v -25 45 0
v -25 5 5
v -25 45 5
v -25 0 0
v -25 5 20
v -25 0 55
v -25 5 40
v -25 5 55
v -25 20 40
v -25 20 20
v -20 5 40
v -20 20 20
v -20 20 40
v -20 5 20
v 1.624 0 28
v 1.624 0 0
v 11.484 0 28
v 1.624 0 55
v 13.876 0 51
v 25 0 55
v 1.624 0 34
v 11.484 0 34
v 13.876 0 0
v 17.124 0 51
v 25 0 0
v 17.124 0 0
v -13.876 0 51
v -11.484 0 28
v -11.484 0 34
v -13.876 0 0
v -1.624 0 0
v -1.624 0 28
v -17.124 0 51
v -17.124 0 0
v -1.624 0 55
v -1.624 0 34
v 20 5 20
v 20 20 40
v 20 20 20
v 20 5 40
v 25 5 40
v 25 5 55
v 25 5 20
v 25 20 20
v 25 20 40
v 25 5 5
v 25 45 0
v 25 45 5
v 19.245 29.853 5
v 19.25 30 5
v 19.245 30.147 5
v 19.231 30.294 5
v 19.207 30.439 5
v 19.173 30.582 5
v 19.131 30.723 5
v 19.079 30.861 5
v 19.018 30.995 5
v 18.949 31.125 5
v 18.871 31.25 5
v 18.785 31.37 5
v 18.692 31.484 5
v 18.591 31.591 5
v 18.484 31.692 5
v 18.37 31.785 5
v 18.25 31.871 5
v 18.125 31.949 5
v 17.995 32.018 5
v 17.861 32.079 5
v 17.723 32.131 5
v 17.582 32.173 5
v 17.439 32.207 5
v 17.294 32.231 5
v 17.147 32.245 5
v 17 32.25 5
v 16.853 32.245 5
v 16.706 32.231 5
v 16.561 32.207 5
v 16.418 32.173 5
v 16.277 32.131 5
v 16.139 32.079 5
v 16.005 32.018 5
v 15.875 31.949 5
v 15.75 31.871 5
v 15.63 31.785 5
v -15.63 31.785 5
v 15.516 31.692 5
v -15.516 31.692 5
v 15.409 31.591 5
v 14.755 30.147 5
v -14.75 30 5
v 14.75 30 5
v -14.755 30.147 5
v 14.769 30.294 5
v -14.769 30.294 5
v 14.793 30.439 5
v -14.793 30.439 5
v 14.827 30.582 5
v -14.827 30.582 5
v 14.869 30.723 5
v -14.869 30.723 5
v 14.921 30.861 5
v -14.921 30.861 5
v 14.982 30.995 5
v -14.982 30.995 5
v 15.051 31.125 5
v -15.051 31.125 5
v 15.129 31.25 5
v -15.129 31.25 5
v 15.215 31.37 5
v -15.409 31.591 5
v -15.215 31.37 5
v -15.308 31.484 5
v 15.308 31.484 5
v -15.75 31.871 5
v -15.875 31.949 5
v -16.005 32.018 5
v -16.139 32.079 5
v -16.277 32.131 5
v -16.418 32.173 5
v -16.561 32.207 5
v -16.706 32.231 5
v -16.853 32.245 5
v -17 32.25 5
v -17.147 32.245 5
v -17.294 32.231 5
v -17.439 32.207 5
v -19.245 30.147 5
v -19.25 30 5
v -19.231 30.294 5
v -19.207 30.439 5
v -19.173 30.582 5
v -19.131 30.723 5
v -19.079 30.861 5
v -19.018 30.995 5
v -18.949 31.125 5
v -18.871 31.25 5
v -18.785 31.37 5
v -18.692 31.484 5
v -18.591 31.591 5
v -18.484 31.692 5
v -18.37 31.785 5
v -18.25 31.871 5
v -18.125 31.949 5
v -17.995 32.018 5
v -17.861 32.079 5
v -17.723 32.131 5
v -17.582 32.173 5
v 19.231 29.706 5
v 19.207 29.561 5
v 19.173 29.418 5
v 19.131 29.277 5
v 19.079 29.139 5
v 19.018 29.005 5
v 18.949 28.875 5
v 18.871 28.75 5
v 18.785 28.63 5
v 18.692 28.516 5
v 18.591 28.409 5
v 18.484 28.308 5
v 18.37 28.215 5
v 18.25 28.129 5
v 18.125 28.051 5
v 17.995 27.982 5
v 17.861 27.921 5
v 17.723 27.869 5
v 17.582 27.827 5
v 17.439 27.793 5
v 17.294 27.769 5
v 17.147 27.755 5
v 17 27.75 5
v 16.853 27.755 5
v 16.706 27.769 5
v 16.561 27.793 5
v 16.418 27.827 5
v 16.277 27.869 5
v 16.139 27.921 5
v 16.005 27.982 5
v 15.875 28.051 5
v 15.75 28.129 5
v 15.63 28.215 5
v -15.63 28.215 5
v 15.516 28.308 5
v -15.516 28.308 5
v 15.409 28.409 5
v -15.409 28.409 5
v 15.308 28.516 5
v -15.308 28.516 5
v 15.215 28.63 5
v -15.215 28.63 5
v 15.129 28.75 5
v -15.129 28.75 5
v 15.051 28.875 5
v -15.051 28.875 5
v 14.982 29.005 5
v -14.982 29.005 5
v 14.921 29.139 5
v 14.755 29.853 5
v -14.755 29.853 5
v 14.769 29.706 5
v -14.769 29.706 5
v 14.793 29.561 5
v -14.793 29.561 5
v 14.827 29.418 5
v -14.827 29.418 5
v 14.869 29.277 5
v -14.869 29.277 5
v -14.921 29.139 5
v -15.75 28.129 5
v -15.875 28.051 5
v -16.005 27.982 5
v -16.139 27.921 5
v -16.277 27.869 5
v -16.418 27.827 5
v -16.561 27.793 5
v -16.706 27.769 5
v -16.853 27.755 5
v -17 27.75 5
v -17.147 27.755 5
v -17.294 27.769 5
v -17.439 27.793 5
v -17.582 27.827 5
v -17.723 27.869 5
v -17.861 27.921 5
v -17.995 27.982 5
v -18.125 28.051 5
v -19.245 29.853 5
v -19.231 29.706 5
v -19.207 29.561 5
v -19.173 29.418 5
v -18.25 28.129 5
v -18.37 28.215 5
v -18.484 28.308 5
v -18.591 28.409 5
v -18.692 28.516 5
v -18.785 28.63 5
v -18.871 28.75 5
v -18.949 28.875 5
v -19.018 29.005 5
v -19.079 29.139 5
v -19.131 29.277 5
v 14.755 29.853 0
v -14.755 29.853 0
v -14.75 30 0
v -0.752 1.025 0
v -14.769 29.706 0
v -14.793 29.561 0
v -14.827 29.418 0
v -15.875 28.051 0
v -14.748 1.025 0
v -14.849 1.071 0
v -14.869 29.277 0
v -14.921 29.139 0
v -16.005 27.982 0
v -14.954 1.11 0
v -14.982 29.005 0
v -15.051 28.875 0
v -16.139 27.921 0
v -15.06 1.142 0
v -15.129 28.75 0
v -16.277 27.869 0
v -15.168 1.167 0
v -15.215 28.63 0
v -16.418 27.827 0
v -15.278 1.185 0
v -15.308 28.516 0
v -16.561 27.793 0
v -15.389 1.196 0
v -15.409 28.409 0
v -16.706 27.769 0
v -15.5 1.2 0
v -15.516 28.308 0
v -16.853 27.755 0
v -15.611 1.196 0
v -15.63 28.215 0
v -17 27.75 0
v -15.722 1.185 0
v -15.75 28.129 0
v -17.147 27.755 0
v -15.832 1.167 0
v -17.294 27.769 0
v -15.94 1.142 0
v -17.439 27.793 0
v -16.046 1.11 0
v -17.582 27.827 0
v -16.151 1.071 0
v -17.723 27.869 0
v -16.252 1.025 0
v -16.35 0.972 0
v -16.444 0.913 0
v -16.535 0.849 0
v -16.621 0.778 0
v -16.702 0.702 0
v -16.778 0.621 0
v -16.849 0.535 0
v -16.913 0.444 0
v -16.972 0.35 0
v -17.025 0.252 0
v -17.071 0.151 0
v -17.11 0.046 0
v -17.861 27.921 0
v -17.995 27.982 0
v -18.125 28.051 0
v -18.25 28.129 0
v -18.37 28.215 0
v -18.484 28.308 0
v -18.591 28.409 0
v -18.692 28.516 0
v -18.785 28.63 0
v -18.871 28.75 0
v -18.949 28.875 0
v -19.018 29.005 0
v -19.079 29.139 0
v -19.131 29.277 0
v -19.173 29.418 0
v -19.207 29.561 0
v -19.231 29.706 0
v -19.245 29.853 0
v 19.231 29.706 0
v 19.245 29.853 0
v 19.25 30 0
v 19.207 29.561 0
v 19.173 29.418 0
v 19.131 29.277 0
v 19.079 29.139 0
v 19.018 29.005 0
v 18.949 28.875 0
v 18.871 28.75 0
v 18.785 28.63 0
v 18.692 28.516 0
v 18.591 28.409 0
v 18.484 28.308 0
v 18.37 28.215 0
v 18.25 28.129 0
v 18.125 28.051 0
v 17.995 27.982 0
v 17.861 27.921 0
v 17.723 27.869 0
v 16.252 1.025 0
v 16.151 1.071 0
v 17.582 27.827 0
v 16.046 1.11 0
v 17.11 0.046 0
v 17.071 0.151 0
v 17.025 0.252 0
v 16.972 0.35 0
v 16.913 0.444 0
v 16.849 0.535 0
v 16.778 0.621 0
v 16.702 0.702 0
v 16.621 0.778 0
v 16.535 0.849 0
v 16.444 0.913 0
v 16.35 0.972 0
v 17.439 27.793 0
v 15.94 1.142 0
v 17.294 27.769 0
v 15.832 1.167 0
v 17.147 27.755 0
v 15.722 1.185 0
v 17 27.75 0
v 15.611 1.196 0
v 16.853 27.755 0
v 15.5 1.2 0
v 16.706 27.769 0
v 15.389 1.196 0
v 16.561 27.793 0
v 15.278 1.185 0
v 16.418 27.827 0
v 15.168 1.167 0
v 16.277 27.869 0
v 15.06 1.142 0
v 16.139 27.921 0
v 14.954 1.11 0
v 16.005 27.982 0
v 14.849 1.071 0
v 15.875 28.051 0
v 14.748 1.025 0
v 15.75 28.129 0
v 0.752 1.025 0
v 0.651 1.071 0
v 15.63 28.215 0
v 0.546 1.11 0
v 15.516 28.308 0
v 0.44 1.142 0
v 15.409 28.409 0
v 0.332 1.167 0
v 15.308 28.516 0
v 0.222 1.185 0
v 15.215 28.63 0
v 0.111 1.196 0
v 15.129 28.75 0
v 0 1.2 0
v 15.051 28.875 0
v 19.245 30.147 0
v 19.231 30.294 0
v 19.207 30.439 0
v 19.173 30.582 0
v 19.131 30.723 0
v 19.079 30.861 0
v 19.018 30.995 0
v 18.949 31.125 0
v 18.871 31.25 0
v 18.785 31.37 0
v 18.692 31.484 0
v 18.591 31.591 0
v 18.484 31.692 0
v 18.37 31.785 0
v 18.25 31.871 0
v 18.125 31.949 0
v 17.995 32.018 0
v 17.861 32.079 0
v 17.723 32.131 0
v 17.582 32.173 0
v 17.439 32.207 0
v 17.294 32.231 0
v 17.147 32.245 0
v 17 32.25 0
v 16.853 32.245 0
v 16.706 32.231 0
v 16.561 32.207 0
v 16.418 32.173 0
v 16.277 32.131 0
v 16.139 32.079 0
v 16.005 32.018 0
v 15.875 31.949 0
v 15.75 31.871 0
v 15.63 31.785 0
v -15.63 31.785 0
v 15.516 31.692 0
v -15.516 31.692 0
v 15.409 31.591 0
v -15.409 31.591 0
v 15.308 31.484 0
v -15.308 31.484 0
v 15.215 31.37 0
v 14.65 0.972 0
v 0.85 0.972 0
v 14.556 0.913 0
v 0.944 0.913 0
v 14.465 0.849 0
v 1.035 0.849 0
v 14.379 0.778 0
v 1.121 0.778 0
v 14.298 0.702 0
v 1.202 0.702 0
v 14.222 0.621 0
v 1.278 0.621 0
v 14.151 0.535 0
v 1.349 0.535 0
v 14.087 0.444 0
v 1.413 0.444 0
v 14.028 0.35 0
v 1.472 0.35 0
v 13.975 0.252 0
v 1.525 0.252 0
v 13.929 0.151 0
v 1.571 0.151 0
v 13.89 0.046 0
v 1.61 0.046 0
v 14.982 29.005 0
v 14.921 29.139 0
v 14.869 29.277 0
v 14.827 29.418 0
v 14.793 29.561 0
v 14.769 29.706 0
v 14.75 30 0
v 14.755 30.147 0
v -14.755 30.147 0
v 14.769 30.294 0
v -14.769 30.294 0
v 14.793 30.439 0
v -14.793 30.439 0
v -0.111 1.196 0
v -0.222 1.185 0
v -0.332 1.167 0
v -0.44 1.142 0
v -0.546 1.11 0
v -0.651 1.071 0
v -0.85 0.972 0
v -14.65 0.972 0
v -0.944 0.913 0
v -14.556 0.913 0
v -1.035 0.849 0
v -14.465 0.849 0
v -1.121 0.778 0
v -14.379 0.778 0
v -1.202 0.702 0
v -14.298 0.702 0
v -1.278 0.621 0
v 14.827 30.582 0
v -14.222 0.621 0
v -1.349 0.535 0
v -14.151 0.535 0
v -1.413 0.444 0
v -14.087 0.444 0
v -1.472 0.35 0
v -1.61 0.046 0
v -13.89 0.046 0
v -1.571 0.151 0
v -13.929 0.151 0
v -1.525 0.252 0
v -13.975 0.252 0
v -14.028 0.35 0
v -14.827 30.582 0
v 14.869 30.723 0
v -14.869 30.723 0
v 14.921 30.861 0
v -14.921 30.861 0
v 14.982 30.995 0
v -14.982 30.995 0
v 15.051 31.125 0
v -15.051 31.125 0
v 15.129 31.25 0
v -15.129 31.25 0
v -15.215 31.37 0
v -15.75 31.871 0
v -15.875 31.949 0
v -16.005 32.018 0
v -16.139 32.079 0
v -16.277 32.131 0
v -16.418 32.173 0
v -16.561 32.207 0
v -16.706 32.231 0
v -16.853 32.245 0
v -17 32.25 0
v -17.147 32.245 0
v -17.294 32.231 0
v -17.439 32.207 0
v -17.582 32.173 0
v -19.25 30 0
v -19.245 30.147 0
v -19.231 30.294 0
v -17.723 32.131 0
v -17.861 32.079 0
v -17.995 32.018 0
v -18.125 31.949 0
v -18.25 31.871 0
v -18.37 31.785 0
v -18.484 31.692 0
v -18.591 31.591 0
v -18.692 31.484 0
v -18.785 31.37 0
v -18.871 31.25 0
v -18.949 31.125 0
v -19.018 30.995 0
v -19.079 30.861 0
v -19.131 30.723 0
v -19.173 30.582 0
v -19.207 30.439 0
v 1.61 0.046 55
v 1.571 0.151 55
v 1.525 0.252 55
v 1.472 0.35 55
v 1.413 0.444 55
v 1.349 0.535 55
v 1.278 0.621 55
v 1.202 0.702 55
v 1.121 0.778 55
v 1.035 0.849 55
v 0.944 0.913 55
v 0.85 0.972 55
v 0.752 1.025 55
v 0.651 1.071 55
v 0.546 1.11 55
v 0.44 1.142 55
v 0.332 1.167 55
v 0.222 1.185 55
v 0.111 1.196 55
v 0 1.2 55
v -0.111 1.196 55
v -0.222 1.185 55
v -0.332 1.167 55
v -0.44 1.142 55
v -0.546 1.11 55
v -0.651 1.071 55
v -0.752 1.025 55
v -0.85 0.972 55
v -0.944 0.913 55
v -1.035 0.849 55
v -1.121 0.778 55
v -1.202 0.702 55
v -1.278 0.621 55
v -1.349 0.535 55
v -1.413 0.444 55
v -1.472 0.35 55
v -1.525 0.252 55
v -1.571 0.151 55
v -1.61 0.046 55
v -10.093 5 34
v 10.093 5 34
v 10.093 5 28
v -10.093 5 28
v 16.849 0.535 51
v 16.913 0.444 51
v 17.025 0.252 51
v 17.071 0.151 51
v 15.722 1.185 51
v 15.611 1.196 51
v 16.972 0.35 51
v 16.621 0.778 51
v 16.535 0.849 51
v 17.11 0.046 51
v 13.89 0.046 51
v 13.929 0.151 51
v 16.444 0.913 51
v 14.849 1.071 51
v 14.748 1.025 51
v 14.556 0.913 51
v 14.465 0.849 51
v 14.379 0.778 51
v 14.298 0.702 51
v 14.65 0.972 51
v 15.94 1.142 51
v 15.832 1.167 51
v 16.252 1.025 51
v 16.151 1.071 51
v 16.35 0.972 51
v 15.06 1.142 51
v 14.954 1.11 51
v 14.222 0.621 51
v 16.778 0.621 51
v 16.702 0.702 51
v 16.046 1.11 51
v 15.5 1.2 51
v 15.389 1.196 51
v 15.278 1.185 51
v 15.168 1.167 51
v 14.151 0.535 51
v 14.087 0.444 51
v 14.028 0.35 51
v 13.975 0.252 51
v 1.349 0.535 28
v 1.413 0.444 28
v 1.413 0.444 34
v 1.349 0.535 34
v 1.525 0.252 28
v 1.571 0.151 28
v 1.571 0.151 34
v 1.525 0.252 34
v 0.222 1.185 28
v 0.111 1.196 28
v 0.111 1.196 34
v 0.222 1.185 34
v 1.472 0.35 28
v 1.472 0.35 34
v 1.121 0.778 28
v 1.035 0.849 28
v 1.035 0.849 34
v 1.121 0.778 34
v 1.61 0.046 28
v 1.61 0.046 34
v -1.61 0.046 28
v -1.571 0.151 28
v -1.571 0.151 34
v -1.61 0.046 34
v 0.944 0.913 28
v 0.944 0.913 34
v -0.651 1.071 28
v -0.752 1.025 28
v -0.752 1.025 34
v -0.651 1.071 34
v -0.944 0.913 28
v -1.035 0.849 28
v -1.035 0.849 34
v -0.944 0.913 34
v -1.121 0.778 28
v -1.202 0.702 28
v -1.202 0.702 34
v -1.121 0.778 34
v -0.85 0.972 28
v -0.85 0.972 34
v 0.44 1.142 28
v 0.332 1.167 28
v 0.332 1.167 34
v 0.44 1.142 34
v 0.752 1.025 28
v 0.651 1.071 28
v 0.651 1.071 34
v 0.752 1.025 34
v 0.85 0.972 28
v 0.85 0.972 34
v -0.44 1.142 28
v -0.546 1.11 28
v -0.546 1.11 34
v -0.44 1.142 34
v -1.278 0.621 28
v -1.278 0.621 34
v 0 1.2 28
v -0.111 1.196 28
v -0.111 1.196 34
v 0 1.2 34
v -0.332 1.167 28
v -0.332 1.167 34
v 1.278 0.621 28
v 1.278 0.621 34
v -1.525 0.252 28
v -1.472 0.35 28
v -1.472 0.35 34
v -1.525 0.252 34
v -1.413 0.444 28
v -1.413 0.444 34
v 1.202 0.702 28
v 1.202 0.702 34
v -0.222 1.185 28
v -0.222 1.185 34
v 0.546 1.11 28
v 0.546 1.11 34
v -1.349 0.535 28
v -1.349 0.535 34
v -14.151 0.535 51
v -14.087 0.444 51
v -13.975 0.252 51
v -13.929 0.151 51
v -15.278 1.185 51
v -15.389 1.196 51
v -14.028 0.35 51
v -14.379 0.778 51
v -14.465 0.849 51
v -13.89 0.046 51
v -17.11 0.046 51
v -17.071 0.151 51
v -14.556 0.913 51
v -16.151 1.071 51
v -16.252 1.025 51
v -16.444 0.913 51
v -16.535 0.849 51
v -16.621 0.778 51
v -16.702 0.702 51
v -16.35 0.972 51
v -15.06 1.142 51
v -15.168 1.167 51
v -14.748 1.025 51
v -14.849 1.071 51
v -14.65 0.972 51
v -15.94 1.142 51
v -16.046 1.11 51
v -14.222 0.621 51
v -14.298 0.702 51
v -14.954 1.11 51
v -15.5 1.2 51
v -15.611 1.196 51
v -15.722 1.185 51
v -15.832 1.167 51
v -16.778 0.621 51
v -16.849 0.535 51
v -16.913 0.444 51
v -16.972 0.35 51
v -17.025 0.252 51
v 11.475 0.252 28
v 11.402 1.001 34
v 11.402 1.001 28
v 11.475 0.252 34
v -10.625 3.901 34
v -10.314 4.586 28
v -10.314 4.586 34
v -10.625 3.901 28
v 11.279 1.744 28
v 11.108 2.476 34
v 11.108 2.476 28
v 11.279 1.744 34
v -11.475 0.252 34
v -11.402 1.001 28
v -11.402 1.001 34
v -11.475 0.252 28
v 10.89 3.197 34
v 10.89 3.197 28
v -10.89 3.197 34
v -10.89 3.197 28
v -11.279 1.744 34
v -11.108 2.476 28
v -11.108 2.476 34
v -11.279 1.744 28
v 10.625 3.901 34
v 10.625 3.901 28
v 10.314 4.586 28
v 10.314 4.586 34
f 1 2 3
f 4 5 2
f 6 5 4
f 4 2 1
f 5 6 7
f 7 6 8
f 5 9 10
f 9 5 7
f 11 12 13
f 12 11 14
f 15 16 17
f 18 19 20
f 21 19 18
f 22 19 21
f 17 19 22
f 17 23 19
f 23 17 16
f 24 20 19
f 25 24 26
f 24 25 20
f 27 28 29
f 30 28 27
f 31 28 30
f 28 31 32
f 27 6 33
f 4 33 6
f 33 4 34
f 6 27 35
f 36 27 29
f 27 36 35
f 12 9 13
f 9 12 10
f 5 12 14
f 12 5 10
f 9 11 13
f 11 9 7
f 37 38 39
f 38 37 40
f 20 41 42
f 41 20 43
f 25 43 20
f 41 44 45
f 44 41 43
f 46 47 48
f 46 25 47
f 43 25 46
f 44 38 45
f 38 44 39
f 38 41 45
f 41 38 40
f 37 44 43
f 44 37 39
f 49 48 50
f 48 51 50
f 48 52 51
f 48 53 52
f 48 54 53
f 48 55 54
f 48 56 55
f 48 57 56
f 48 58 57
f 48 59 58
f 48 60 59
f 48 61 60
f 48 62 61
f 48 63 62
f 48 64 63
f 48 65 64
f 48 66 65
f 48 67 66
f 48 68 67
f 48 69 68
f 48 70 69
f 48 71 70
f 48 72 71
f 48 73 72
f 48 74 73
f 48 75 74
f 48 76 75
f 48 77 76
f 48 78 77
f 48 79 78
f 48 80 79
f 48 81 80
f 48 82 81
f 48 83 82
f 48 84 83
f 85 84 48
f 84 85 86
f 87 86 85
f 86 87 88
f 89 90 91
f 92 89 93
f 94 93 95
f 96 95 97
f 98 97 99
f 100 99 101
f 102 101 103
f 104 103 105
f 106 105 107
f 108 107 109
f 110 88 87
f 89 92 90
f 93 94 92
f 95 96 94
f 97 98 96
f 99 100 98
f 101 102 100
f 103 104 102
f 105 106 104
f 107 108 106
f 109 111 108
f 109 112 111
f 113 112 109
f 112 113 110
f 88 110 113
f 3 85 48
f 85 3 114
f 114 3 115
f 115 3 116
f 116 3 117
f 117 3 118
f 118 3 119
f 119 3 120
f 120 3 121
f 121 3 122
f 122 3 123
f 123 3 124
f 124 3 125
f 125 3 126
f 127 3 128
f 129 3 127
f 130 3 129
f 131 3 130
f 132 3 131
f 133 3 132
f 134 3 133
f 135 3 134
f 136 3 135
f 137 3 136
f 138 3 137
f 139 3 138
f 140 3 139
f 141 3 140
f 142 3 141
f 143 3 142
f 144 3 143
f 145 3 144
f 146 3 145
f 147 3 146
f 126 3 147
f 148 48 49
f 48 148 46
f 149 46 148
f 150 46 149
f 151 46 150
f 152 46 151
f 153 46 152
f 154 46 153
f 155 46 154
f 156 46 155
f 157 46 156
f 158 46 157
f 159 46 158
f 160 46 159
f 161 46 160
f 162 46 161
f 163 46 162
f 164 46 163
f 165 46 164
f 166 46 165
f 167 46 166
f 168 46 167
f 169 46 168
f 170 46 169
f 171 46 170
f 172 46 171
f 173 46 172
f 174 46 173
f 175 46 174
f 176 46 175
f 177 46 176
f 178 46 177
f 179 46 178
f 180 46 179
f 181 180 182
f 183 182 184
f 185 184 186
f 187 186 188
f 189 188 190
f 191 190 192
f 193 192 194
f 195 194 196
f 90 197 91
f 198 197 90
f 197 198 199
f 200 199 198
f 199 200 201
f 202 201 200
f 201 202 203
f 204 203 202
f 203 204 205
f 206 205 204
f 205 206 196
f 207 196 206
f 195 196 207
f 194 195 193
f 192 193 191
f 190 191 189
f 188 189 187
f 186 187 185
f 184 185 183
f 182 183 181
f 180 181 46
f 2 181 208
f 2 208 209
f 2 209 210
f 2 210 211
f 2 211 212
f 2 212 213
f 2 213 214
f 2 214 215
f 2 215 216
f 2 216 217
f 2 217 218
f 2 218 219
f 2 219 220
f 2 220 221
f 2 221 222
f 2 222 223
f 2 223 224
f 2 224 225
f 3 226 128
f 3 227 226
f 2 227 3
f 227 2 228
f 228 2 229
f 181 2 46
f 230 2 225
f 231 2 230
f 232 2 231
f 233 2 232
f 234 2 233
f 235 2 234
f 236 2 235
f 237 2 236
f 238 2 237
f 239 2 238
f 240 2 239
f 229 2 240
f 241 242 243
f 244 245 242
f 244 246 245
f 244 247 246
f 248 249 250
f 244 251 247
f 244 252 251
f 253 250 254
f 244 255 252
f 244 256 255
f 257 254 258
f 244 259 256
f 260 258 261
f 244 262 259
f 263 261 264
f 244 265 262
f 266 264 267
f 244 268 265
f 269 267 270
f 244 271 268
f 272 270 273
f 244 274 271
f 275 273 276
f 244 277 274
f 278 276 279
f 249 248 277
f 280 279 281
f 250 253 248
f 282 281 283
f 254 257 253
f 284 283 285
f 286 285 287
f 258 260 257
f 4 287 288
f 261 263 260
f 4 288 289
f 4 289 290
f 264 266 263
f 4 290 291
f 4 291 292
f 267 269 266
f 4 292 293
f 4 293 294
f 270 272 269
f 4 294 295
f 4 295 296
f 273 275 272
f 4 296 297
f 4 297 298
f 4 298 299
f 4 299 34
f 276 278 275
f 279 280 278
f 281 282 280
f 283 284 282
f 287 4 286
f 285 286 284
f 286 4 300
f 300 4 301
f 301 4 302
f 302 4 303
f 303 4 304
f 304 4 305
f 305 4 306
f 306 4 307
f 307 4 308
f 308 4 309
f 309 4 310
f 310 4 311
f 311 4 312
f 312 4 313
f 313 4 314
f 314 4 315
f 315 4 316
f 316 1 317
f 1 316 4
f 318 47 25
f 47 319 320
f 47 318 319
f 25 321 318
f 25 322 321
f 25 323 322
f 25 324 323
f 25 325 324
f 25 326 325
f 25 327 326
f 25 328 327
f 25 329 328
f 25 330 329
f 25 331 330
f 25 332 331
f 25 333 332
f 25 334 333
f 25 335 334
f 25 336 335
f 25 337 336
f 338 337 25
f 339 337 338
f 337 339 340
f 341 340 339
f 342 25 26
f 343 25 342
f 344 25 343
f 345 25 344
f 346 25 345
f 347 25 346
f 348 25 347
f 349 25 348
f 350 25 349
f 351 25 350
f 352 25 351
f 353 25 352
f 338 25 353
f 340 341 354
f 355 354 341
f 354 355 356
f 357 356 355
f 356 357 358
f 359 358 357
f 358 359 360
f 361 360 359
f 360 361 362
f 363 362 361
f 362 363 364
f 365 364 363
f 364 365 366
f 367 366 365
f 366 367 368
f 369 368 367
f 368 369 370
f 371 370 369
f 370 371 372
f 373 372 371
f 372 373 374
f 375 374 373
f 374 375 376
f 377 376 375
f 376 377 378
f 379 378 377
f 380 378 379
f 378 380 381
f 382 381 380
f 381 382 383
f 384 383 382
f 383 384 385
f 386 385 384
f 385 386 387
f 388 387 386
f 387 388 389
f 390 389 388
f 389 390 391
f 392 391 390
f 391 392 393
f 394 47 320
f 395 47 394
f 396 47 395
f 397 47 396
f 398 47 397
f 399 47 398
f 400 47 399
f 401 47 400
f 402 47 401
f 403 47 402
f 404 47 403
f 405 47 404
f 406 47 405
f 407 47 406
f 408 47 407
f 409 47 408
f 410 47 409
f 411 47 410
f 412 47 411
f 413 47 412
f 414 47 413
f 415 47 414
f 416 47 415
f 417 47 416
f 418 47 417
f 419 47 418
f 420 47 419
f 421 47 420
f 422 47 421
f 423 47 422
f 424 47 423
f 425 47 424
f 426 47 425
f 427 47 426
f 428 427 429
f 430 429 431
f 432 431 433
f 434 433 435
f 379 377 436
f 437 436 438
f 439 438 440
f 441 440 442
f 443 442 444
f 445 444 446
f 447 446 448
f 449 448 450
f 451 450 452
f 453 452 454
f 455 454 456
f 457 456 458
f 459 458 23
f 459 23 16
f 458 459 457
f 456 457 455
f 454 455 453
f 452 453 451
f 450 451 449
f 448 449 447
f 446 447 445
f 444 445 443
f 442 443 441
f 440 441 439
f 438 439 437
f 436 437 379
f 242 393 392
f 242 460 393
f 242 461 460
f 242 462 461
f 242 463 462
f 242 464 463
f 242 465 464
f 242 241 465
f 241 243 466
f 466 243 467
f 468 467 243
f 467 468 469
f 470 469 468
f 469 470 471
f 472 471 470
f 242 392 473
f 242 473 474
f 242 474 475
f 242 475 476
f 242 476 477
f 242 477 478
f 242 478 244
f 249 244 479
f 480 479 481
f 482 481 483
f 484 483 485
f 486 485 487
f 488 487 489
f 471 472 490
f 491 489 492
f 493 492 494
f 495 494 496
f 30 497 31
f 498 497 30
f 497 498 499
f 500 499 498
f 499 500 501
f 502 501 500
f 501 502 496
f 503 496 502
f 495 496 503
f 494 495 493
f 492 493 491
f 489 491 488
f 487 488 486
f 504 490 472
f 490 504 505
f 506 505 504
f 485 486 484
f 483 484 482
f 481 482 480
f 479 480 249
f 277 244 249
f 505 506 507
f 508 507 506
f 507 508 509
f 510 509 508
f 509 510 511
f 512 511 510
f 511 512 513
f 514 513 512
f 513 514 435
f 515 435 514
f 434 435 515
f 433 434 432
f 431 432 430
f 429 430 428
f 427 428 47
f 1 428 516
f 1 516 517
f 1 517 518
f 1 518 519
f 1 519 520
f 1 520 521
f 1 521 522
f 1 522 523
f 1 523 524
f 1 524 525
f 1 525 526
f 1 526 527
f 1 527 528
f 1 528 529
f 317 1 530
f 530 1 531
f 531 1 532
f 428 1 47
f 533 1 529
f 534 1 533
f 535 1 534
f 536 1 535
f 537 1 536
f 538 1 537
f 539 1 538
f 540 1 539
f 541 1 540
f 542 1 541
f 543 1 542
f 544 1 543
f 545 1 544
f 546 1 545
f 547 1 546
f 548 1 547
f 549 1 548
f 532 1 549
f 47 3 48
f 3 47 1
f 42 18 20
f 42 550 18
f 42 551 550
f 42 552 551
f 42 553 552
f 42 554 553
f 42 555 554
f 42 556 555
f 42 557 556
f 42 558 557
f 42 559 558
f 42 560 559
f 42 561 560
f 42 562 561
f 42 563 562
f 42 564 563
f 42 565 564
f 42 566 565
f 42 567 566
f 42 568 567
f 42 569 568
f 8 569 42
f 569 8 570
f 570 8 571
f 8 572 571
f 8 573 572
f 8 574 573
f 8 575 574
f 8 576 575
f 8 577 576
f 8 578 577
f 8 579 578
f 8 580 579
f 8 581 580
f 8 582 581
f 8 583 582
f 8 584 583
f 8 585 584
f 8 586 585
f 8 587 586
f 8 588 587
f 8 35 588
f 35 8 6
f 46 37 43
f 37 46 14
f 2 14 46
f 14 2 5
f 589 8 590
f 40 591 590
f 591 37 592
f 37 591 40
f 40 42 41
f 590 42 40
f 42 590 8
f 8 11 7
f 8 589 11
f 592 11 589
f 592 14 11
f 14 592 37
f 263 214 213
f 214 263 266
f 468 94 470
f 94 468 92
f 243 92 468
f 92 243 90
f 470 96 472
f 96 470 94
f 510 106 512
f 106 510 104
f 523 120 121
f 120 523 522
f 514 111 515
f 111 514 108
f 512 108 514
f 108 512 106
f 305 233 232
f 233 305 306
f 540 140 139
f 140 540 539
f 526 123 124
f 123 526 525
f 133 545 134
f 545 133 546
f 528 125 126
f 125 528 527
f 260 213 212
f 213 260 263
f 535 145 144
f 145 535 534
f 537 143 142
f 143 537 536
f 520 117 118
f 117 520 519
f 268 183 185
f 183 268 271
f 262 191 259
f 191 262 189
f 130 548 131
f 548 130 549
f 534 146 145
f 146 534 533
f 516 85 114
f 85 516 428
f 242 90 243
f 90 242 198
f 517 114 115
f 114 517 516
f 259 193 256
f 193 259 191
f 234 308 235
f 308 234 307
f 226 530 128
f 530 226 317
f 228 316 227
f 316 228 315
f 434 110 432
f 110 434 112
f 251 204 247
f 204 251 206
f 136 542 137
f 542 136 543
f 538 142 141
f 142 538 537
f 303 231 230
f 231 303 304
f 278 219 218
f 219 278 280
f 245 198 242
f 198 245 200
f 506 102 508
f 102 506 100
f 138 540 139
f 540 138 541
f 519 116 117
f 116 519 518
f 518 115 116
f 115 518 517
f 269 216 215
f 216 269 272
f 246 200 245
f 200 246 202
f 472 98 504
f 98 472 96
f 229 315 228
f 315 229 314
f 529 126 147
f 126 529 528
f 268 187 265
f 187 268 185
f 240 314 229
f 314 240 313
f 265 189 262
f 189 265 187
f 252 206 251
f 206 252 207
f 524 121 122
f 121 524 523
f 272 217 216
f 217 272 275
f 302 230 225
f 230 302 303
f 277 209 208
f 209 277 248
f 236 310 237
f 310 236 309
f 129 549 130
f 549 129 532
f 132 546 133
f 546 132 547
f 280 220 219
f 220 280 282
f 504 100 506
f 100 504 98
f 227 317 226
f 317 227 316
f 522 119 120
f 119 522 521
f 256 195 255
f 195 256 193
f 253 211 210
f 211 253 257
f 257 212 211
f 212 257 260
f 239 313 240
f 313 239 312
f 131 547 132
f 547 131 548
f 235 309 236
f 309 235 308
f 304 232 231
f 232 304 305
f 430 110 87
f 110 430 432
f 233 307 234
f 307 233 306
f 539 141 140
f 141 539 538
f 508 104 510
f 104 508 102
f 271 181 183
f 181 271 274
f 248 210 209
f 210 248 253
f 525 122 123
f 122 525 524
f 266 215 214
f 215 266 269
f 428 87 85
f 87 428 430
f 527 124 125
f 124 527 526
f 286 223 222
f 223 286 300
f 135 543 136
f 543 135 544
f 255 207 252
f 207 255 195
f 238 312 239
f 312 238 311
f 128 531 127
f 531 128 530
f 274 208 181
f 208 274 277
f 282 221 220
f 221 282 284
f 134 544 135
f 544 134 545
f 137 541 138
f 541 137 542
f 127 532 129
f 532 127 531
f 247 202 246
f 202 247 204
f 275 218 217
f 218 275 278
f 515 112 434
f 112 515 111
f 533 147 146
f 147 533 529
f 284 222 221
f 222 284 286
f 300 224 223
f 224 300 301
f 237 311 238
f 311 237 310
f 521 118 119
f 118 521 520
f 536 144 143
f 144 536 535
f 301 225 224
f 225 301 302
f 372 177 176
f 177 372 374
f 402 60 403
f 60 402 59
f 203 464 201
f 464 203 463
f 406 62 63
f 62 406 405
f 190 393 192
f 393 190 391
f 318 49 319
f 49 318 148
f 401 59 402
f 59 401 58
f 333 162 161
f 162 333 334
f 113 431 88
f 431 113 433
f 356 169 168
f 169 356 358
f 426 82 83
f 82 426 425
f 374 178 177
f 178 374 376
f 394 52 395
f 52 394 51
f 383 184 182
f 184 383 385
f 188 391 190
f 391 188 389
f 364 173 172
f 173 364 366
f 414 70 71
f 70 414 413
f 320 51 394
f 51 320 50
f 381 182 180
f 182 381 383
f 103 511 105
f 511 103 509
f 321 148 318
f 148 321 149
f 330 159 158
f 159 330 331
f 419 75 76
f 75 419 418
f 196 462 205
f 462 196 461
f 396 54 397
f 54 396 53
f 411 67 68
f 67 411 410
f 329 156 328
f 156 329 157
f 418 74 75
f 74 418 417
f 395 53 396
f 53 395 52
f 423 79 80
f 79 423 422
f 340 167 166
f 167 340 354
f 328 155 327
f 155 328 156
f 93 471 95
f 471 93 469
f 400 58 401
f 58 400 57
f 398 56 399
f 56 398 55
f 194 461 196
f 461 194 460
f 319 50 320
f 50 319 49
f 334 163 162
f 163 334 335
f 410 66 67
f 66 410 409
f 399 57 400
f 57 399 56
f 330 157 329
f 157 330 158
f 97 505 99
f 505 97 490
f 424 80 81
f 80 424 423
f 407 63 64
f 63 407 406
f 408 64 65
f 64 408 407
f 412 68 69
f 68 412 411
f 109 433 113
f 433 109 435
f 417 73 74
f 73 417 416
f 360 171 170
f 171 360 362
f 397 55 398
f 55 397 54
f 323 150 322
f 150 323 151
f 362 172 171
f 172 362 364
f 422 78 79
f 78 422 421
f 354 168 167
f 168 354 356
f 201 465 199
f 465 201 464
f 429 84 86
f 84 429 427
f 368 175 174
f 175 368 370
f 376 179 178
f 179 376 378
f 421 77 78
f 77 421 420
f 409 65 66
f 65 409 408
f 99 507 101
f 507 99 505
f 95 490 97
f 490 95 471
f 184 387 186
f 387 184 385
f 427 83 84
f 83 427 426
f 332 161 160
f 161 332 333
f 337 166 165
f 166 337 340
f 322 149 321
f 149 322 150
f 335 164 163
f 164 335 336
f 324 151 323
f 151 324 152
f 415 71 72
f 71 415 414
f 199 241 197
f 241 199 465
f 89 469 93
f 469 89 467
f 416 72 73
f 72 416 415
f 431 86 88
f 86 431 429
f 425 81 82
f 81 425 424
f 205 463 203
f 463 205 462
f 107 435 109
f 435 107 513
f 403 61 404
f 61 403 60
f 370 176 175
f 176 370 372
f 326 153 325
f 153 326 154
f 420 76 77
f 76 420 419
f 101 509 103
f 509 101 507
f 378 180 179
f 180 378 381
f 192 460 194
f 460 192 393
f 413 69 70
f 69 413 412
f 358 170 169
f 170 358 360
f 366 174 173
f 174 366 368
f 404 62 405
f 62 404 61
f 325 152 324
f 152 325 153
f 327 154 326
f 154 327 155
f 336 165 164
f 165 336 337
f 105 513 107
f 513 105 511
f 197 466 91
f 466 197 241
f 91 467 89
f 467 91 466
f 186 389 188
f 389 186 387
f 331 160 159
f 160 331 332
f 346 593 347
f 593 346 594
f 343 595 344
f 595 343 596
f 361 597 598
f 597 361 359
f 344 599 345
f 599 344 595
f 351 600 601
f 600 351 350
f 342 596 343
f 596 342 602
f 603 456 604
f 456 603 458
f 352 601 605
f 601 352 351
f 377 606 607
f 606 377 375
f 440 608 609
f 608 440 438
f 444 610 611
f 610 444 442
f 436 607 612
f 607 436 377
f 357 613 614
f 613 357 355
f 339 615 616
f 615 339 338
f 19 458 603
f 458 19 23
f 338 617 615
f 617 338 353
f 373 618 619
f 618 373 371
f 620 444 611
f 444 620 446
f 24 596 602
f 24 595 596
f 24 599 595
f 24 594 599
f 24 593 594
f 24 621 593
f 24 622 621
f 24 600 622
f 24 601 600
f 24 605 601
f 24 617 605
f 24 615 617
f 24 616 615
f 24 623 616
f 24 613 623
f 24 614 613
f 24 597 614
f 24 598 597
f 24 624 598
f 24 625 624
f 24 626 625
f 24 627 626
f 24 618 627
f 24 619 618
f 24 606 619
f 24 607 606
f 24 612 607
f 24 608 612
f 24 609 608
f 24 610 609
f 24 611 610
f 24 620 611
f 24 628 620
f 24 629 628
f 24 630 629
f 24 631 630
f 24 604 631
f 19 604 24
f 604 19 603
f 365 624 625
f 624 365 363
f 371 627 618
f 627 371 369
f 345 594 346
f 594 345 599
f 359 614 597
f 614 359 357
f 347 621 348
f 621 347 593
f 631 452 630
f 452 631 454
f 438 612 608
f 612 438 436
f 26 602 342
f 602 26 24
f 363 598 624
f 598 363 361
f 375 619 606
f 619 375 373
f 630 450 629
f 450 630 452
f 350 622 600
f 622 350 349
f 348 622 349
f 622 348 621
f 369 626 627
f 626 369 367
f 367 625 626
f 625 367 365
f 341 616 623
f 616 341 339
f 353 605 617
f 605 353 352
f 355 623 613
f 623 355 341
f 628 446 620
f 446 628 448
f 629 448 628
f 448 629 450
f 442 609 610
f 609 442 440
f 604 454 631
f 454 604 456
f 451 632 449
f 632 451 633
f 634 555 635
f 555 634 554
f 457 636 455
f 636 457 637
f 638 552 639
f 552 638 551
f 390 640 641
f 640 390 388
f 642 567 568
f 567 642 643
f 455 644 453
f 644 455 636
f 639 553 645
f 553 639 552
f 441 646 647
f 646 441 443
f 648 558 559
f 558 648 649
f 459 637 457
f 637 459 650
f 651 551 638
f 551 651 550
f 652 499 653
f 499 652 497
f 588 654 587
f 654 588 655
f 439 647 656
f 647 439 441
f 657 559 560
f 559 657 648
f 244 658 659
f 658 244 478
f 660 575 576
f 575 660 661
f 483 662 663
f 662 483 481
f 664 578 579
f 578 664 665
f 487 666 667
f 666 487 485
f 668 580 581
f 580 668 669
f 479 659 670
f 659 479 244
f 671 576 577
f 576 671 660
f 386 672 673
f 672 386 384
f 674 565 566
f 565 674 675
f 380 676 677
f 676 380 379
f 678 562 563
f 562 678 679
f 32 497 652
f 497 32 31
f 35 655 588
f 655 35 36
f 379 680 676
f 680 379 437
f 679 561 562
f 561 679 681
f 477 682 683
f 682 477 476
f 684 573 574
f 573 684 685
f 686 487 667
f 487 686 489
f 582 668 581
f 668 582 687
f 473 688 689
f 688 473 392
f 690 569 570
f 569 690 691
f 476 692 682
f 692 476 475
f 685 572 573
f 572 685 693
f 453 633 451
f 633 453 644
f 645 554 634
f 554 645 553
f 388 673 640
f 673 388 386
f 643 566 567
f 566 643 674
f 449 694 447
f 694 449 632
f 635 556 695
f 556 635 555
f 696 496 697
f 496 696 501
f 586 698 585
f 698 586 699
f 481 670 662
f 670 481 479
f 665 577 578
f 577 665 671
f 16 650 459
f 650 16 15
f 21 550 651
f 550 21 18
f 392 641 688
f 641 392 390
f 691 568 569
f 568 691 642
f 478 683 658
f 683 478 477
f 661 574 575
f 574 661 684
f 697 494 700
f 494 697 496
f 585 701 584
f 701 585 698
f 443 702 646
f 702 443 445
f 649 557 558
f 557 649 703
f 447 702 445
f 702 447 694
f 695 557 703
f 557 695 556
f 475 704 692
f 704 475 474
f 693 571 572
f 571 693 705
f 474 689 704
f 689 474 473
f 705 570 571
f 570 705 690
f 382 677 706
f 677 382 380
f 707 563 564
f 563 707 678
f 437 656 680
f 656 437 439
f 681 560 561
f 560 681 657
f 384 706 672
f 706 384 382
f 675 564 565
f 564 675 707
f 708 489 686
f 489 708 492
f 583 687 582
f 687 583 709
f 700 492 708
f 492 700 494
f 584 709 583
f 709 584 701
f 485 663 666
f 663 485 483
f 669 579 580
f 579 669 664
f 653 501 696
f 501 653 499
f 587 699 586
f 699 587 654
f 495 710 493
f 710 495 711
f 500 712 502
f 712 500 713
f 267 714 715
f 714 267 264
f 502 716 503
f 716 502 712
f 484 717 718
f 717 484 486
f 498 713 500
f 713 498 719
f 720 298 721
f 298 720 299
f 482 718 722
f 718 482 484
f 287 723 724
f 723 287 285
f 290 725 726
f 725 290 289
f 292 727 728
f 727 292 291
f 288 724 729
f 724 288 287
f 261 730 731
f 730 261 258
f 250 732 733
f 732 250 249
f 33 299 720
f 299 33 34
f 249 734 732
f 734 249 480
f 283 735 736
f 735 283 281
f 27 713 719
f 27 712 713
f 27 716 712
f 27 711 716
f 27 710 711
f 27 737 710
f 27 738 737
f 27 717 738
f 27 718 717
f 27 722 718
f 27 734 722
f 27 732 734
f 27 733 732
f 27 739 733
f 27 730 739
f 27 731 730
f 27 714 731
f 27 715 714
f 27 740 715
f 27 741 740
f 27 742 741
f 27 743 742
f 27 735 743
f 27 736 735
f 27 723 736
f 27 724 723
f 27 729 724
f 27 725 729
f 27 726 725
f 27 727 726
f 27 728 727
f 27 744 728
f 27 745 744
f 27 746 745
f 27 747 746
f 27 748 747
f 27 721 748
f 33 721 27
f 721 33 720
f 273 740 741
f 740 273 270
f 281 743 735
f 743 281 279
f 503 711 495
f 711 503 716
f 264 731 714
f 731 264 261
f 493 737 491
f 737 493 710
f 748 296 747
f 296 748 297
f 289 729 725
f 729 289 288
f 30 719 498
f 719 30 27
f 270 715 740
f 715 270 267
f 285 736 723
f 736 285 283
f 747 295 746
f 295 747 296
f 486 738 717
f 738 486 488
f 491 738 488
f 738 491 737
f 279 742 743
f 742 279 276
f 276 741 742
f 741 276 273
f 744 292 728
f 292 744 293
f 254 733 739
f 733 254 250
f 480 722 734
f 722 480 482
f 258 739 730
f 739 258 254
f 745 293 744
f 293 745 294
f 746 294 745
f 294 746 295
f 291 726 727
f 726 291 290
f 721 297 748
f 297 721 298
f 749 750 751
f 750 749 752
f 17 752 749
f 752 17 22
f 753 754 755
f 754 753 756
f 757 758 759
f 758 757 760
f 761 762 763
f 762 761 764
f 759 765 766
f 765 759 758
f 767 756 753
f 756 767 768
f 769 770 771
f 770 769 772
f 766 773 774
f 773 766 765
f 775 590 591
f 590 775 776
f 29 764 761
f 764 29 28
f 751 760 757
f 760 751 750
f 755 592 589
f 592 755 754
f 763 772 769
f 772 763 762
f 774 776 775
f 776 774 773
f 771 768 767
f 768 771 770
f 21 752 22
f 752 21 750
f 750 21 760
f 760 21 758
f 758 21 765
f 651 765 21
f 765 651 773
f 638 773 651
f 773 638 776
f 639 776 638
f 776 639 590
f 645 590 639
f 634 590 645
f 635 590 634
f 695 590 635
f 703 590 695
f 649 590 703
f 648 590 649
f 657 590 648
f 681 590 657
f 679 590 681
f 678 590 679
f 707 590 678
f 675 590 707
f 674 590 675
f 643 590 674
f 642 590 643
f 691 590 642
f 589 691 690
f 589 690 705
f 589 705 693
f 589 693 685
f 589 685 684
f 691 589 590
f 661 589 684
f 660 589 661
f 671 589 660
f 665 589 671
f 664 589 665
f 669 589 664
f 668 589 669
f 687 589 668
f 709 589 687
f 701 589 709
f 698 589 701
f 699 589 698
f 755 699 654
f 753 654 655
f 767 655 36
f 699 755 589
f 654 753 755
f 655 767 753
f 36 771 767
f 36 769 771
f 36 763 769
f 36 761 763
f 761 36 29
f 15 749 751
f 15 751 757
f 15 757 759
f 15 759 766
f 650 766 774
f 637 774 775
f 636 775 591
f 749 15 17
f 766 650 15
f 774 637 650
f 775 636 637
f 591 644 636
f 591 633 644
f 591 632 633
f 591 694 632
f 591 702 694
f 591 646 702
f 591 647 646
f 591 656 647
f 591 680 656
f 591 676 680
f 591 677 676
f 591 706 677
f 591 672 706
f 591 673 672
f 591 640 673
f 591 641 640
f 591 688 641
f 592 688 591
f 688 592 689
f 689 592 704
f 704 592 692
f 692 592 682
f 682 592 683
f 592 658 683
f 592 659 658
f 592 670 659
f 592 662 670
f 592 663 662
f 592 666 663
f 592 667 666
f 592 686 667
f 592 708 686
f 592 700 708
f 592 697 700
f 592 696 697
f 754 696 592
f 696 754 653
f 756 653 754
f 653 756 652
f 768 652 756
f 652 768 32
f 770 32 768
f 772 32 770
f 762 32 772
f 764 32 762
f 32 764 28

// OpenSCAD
// L-shaped mounting bracket for NEMA 17 stepper motor (syringe pump)
// Print orientation: base plate on bed, motor plate building upward

$fn = 96;

// ---- Base plate ----
base_x0 = -25; base_x1 = 25;   // x span of base plate
base_y0 = 0;   base_y1 = 45;  // y span of base plate
base_z0 = 0;   base_z1 = 5;   // base plate thickness

// ---- M4 through-holes in base ----
hole_m4_x  = -17; hole_m4_y = 30;
hole_m4_x2 =  17; hole_m4_y2 = 30;
hole_d4    = 4.5;

// ---- Motor plate ----
motor_x0 = -25; motor_x1 = 25; // x span of motor plate
motor_y0 = 0;   motor_y1 = 5;  // y span (tangent to base)
motor_z0 = 5;   motor_z1 = 55; // plate thickness (z 0..50 + overlap)

// ---- Boss hole ----
boss_d   = 23;   // boss hole diameter
boss_x   = 0;    // boss hole x centre
boss_z   = 28;   // boss hole z centre

// ---- M3 screw holes ----
screw_d  = 3.4;  // M3 hole diameter
screw_n  = 4;    // number of screw holes
screw_r  = 15.5; // circumradius of square pattern (31 mm side)

// ---- Gussets ----
gusset_t = 5;    // gusset thickness
gusset_a = 20;   // gusset leg along +Y
gusset_b = 20;   // gusset leg along +Z
gusset_x0 = -25; // left edge x
gusset_x1 =  25; // right edge x

// ---- Misc ----
eps = 0.5;       // cutter overshoot

difference() {
    union() {
        // Base plate
        translate([base_x0, base_y0, base_z0])
            cube([base_x1 - base_x0, base_y1 - base_y0, base_z1 - base_z0]);

        // Motor plate
        translate([motor_x0, motor_y0, motor_z0])
            cube([motor_x1 - motor_x0, motor_y1 - motor_y0, motor_z1 - motor_z0]);

        // Gussets (right triangle in YZ, flush with left/right edges)
        for (sx = [-1, 1])
            translate([sx > 0 ? gusset_x1 - gusset_t : gusset_x0,
                       gusset_a, gusset_b])
                rotate([90, 0, 0])
                    cube([gusset_t, gusset_a, gusset_b]);
    }

    // M4 holes in base
    for (i = [0, 1])
        translate([(i == 0 ? hole_m4_x : hole_m4_x2),
                   (i == 0 ? hole_m4_y : hole_m4_y2),
                   -eps])
            cylinder(d = hole_d4, h = base_z1 - base_z0 + 2 * eps);

    // Boss hole through motor plate
    translate([boss_x, -eps, boss_z])
        cylinder(d = boss_d, h = motor_y1 - motor_y0 + 2 * eps);

    // M3 screw holes
    for (j = [0 : screw_n - 1]) {
        a = screw_r * cos(j * 90);
        b = screw_r * sin(j * 90);
        translate([a, motor_y0 - eps, b])
            cylinder(d = screw_d, h = motor_z1 - motor_z0 + 2 * eps);
    }
}
